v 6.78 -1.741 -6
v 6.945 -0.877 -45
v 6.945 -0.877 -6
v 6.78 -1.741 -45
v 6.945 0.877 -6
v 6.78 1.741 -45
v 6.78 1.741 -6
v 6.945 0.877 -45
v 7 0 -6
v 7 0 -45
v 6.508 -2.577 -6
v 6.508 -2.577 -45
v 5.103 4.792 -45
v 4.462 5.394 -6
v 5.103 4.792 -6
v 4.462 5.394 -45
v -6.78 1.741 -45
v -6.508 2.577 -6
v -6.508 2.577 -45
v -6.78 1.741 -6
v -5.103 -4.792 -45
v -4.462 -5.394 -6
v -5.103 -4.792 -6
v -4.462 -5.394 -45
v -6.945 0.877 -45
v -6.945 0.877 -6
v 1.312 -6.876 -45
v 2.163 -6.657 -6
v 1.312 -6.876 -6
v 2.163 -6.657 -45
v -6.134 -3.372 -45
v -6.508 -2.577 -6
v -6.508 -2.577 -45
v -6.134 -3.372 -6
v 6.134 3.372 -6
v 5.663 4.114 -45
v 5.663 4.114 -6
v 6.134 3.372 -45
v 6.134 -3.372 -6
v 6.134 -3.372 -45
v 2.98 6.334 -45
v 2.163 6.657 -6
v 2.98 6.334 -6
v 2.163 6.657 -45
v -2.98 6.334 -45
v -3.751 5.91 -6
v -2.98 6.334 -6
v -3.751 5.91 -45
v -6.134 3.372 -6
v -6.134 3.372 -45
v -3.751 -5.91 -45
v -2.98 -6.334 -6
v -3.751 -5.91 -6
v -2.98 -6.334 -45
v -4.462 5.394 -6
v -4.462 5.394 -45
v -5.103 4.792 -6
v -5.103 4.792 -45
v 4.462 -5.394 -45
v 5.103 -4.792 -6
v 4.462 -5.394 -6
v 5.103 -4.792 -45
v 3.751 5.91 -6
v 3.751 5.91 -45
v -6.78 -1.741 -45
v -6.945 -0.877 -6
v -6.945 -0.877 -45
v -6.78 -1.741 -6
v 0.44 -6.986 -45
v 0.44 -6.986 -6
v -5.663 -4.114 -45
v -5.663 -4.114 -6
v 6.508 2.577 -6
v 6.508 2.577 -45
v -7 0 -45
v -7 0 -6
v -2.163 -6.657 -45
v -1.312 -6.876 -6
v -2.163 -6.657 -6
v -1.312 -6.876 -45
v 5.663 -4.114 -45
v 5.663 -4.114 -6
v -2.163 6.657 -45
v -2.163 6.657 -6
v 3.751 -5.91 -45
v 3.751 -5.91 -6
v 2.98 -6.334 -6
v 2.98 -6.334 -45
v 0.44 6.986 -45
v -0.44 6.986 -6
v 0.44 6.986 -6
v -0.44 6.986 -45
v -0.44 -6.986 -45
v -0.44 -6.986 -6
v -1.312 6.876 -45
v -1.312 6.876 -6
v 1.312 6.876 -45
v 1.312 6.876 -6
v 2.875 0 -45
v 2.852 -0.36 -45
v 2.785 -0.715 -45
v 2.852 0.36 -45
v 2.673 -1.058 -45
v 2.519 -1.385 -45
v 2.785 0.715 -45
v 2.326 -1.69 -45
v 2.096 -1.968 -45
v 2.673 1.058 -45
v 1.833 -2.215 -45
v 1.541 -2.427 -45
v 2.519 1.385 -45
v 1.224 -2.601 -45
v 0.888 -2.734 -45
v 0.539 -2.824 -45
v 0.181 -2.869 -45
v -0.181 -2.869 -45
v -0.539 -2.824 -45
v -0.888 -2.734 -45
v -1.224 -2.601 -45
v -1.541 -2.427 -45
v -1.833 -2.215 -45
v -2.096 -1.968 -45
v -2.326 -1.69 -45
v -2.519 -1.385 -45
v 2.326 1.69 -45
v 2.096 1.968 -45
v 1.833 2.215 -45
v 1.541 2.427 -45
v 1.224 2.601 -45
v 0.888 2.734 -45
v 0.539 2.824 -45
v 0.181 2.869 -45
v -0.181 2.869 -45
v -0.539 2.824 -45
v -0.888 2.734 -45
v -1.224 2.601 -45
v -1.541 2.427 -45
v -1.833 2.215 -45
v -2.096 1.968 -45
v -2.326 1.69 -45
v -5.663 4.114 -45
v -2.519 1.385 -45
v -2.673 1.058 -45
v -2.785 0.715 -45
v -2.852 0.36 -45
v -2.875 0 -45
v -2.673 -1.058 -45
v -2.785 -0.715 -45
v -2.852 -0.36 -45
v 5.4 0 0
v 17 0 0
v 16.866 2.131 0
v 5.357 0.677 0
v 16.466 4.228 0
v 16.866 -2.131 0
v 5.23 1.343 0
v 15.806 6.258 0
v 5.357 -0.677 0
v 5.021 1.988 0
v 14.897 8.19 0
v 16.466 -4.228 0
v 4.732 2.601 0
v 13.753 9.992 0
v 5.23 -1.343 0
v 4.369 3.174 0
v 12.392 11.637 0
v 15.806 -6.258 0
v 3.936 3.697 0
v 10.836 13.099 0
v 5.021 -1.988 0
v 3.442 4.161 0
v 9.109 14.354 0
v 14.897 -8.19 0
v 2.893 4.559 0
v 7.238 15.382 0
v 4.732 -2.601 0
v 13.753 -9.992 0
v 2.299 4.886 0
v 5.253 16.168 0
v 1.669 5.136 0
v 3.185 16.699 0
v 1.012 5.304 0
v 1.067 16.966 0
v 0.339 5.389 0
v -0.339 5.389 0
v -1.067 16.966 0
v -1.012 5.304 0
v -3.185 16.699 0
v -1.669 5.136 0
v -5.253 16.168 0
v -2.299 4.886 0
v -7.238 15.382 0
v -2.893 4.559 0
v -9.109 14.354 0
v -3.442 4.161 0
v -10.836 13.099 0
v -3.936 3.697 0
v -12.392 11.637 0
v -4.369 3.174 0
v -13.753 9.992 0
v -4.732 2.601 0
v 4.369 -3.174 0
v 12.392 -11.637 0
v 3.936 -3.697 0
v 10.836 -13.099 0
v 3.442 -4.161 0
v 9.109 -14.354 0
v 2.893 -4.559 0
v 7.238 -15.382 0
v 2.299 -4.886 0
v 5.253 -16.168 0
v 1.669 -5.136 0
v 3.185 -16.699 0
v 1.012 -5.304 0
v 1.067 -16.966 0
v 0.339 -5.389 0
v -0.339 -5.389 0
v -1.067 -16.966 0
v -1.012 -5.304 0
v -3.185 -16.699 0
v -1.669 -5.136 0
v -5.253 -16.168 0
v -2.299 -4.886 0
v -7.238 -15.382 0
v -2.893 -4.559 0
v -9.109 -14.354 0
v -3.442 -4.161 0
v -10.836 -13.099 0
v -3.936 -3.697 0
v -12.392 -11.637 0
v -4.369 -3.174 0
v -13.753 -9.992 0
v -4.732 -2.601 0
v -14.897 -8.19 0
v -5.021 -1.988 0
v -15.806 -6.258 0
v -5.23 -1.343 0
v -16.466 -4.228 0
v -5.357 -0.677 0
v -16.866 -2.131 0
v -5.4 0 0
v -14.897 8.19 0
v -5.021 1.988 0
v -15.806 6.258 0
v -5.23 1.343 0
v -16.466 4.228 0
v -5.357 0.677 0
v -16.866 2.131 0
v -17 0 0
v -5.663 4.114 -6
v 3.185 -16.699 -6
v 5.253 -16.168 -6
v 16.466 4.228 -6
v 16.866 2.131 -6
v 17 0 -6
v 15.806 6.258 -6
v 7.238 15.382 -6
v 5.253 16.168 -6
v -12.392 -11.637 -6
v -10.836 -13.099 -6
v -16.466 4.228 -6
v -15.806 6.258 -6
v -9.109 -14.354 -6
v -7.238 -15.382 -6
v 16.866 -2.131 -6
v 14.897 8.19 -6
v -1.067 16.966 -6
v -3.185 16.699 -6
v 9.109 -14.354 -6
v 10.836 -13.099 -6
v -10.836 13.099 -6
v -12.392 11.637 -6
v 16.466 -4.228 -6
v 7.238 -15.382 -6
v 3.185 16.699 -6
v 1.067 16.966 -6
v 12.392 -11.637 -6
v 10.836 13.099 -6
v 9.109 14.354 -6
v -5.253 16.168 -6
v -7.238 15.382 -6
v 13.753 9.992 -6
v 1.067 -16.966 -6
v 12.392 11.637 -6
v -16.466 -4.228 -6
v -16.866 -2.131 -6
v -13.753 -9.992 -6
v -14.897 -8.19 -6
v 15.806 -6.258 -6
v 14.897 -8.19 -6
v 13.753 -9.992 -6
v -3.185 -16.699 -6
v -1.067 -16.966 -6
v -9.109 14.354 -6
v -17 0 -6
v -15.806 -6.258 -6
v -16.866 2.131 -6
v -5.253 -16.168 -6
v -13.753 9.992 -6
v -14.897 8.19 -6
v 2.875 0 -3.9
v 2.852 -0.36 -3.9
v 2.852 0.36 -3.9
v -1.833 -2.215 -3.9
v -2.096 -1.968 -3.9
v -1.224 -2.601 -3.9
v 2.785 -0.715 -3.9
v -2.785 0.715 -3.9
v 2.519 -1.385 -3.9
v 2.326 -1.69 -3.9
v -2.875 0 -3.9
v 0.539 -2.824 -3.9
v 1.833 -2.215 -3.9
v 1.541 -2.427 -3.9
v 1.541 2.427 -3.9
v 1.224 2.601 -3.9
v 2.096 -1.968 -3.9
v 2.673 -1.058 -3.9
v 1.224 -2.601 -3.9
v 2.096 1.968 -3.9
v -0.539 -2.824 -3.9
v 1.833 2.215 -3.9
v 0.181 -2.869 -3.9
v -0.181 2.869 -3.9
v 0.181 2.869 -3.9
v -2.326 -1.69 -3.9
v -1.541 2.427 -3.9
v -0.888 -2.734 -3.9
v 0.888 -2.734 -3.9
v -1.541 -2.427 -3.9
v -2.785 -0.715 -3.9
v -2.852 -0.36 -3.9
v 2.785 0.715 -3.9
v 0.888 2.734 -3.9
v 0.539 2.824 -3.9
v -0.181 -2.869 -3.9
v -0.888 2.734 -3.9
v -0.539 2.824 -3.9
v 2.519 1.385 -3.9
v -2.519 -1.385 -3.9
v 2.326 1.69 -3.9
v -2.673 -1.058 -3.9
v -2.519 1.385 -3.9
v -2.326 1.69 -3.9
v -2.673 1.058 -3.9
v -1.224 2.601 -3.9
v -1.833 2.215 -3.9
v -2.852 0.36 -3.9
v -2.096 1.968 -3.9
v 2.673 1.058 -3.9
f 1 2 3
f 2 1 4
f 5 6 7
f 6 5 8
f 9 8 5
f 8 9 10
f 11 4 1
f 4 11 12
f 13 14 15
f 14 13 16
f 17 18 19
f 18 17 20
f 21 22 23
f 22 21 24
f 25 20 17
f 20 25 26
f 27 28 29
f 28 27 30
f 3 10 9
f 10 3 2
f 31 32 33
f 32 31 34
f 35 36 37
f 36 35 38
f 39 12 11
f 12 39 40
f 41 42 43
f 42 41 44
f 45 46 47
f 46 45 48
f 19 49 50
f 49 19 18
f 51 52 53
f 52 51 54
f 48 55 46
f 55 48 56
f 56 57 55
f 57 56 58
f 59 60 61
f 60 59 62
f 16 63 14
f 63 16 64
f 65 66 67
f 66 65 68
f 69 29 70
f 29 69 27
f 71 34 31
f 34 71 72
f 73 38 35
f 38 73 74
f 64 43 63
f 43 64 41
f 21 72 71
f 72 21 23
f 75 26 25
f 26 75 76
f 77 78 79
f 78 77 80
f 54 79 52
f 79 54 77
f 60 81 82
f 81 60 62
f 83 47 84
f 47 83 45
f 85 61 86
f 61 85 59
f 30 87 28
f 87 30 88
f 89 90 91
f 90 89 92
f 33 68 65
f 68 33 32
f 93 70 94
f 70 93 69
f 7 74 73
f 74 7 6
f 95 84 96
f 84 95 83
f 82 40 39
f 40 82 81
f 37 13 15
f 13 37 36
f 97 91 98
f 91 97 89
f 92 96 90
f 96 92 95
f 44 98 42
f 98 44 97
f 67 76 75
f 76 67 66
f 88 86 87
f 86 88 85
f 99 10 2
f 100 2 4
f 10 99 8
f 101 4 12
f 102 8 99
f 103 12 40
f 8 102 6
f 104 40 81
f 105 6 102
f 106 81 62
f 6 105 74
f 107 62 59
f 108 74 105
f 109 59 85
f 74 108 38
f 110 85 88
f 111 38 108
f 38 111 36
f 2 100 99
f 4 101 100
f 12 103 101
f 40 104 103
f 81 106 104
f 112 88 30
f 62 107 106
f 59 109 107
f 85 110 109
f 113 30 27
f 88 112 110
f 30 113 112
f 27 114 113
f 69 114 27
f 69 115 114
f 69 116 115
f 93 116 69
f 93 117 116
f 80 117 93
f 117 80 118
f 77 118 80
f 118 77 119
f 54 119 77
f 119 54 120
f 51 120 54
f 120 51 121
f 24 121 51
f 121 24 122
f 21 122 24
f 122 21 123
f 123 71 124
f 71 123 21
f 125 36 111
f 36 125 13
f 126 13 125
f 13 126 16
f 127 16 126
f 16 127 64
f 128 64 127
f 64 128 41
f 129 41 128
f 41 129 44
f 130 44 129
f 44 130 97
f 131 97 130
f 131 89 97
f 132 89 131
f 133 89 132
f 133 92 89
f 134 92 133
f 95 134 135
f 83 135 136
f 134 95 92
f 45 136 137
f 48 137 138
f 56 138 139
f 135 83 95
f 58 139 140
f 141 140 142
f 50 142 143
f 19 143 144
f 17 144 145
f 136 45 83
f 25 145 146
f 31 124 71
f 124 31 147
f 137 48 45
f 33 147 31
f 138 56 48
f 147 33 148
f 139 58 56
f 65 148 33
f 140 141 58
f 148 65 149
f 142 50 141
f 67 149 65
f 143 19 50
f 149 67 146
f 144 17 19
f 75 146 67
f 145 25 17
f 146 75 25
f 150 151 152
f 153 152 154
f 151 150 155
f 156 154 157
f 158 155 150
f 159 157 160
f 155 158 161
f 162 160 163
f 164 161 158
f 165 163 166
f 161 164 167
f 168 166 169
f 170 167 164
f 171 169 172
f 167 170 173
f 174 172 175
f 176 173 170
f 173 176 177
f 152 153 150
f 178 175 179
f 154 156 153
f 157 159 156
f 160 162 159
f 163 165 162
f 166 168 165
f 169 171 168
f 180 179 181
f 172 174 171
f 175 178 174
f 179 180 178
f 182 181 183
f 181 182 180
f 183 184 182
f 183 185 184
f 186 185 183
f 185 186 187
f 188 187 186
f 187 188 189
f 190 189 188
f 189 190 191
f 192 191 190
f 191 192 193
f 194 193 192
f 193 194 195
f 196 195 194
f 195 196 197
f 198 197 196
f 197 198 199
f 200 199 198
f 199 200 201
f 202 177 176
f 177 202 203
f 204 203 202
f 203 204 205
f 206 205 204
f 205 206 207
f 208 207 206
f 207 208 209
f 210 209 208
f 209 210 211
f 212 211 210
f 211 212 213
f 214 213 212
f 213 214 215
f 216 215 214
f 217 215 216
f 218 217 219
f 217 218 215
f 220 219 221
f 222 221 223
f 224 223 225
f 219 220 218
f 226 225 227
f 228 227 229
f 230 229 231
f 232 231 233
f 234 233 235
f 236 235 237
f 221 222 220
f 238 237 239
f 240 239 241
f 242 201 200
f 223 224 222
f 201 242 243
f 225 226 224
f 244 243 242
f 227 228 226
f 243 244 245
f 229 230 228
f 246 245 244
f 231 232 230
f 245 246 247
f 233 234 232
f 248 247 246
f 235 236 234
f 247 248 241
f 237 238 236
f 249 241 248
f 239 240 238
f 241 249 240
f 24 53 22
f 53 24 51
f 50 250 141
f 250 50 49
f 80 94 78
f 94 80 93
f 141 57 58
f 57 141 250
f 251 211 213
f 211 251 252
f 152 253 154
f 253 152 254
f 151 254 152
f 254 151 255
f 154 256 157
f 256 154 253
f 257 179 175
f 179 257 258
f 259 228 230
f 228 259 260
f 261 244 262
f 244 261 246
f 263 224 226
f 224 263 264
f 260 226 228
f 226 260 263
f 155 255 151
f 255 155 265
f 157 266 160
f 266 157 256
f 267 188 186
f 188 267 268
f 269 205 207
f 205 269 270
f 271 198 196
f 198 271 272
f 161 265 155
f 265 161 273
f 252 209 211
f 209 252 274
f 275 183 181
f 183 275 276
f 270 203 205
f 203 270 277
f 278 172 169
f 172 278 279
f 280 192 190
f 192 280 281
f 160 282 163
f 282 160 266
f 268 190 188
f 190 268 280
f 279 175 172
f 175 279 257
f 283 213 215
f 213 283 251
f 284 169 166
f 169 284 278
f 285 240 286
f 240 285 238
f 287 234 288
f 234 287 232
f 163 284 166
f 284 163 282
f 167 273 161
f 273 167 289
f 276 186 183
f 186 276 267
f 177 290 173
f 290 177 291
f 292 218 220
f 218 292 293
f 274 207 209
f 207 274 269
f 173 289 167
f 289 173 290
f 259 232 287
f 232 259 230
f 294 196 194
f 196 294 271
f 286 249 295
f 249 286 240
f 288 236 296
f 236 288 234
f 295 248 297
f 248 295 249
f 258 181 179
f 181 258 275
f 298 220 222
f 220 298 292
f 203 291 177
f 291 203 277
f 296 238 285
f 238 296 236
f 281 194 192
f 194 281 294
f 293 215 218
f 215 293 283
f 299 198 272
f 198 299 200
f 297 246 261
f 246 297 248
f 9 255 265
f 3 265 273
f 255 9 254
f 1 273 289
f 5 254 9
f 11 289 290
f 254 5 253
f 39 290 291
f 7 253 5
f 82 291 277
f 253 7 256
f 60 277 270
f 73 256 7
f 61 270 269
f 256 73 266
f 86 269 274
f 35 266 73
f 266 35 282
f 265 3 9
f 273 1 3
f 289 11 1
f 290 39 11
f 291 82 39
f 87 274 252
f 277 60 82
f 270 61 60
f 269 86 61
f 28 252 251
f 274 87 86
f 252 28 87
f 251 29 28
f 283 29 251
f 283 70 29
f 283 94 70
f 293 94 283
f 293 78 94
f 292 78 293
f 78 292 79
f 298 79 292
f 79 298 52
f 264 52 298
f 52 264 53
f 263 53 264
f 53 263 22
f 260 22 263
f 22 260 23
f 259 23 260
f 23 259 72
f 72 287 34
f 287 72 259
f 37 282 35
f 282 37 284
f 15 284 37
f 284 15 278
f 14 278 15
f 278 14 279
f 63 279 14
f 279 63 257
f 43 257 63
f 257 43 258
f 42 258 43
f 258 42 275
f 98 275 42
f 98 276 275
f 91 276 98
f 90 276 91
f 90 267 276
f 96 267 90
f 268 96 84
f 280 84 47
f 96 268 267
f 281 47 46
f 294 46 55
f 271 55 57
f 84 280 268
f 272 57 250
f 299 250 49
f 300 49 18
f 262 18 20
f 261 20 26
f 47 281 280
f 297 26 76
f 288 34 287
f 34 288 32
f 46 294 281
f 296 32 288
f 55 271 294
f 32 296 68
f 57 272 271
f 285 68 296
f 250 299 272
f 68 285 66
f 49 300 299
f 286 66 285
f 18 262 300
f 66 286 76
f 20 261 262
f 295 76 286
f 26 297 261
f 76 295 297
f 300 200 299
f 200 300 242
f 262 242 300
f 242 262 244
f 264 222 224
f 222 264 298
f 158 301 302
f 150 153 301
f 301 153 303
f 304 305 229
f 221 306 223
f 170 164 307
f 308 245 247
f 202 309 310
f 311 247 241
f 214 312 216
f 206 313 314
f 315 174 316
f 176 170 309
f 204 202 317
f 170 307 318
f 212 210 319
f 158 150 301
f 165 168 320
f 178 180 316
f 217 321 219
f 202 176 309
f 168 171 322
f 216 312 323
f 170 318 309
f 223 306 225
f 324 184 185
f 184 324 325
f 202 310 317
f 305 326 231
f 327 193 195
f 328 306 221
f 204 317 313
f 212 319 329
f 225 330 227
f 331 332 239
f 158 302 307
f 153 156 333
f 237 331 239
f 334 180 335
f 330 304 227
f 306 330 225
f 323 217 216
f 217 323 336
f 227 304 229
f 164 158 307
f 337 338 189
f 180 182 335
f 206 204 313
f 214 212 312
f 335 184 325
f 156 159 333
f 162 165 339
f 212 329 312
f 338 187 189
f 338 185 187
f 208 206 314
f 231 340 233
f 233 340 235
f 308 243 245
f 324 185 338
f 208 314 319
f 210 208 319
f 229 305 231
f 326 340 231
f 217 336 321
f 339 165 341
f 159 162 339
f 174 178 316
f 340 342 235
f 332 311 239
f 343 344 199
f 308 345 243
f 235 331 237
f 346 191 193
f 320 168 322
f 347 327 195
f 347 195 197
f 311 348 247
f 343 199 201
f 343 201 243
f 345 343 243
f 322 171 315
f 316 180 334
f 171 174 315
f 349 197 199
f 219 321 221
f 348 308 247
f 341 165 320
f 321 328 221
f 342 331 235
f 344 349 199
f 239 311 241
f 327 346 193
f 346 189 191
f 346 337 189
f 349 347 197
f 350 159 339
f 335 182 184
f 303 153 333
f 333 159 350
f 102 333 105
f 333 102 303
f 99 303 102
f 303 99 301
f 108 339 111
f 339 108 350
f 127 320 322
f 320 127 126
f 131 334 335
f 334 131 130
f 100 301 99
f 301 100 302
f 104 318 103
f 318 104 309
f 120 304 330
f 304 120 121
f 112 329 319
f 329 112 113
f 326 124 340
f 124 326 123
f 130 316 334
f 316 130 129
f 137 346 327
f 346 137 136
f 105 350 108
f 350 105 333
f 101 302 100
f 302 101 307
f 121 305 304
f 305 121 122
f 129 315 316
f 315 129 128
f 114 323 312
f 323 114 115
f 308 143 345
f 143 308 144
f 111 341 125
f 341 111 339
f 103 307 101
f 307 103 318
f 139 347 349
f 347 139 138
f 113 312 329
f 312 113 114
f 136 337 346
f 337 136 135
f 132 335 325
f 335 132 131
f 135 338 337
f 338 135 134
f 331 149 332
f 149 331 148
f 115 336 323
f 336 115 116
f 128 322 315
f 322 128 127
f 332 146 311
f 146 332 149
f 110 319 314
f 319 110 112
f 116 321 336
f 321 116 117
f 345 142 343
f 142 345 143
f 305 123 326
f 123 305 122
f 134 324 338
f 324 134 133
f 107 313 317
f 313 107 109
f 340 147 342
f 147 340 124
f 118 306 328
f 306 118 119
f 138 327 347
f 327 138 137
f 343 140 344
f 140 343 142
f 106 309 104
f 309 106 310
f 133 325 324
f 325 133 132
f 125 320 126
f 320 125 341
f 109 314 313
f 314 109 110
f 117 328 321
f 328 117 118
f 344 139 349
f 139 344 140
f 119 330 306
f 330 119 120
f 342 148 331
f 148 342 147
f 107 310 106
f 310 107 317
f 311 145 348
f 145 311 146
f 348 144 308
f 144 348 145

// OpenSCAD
$fn = 50;


difference() {
	union() {
		translate(v = [0, 0, -45.0000000000]) {
			cylinder(h = 45, r = 7.0000000000);
		}
		translate(v = [0, 0, -6.0000000000]) {
			cylinder(h = 6, r = 17.0000000000);
		}
	}
	union() {
		translate(v = [0, 0, 0]) {
			rotate(a = [0, 0, 0]) {
				difference() {
					union() {
						#translate(v = [0, 0, -45.0000000000]) {
							cylinder(h = 45, r = 2.6000000000);
						}
						#translate(v = [0, 0, -3.9000000000]) {
							cylinder(h = 3.9000000000, r = 7.0000000000, r1 = 2.8750000000, r2 = 5.4000000000);
						}
						#translate(v = [0, 0, -45.0000000000]) {
							cylinder(h = 45, r = 2.8750000000);
						}
						#translate(v = [0, 0, -45.0000000000]) {
							cylinder(h = 45, r = 2.6000000000);
						}
					}
					union();
				}
			}
		}
	}
}
